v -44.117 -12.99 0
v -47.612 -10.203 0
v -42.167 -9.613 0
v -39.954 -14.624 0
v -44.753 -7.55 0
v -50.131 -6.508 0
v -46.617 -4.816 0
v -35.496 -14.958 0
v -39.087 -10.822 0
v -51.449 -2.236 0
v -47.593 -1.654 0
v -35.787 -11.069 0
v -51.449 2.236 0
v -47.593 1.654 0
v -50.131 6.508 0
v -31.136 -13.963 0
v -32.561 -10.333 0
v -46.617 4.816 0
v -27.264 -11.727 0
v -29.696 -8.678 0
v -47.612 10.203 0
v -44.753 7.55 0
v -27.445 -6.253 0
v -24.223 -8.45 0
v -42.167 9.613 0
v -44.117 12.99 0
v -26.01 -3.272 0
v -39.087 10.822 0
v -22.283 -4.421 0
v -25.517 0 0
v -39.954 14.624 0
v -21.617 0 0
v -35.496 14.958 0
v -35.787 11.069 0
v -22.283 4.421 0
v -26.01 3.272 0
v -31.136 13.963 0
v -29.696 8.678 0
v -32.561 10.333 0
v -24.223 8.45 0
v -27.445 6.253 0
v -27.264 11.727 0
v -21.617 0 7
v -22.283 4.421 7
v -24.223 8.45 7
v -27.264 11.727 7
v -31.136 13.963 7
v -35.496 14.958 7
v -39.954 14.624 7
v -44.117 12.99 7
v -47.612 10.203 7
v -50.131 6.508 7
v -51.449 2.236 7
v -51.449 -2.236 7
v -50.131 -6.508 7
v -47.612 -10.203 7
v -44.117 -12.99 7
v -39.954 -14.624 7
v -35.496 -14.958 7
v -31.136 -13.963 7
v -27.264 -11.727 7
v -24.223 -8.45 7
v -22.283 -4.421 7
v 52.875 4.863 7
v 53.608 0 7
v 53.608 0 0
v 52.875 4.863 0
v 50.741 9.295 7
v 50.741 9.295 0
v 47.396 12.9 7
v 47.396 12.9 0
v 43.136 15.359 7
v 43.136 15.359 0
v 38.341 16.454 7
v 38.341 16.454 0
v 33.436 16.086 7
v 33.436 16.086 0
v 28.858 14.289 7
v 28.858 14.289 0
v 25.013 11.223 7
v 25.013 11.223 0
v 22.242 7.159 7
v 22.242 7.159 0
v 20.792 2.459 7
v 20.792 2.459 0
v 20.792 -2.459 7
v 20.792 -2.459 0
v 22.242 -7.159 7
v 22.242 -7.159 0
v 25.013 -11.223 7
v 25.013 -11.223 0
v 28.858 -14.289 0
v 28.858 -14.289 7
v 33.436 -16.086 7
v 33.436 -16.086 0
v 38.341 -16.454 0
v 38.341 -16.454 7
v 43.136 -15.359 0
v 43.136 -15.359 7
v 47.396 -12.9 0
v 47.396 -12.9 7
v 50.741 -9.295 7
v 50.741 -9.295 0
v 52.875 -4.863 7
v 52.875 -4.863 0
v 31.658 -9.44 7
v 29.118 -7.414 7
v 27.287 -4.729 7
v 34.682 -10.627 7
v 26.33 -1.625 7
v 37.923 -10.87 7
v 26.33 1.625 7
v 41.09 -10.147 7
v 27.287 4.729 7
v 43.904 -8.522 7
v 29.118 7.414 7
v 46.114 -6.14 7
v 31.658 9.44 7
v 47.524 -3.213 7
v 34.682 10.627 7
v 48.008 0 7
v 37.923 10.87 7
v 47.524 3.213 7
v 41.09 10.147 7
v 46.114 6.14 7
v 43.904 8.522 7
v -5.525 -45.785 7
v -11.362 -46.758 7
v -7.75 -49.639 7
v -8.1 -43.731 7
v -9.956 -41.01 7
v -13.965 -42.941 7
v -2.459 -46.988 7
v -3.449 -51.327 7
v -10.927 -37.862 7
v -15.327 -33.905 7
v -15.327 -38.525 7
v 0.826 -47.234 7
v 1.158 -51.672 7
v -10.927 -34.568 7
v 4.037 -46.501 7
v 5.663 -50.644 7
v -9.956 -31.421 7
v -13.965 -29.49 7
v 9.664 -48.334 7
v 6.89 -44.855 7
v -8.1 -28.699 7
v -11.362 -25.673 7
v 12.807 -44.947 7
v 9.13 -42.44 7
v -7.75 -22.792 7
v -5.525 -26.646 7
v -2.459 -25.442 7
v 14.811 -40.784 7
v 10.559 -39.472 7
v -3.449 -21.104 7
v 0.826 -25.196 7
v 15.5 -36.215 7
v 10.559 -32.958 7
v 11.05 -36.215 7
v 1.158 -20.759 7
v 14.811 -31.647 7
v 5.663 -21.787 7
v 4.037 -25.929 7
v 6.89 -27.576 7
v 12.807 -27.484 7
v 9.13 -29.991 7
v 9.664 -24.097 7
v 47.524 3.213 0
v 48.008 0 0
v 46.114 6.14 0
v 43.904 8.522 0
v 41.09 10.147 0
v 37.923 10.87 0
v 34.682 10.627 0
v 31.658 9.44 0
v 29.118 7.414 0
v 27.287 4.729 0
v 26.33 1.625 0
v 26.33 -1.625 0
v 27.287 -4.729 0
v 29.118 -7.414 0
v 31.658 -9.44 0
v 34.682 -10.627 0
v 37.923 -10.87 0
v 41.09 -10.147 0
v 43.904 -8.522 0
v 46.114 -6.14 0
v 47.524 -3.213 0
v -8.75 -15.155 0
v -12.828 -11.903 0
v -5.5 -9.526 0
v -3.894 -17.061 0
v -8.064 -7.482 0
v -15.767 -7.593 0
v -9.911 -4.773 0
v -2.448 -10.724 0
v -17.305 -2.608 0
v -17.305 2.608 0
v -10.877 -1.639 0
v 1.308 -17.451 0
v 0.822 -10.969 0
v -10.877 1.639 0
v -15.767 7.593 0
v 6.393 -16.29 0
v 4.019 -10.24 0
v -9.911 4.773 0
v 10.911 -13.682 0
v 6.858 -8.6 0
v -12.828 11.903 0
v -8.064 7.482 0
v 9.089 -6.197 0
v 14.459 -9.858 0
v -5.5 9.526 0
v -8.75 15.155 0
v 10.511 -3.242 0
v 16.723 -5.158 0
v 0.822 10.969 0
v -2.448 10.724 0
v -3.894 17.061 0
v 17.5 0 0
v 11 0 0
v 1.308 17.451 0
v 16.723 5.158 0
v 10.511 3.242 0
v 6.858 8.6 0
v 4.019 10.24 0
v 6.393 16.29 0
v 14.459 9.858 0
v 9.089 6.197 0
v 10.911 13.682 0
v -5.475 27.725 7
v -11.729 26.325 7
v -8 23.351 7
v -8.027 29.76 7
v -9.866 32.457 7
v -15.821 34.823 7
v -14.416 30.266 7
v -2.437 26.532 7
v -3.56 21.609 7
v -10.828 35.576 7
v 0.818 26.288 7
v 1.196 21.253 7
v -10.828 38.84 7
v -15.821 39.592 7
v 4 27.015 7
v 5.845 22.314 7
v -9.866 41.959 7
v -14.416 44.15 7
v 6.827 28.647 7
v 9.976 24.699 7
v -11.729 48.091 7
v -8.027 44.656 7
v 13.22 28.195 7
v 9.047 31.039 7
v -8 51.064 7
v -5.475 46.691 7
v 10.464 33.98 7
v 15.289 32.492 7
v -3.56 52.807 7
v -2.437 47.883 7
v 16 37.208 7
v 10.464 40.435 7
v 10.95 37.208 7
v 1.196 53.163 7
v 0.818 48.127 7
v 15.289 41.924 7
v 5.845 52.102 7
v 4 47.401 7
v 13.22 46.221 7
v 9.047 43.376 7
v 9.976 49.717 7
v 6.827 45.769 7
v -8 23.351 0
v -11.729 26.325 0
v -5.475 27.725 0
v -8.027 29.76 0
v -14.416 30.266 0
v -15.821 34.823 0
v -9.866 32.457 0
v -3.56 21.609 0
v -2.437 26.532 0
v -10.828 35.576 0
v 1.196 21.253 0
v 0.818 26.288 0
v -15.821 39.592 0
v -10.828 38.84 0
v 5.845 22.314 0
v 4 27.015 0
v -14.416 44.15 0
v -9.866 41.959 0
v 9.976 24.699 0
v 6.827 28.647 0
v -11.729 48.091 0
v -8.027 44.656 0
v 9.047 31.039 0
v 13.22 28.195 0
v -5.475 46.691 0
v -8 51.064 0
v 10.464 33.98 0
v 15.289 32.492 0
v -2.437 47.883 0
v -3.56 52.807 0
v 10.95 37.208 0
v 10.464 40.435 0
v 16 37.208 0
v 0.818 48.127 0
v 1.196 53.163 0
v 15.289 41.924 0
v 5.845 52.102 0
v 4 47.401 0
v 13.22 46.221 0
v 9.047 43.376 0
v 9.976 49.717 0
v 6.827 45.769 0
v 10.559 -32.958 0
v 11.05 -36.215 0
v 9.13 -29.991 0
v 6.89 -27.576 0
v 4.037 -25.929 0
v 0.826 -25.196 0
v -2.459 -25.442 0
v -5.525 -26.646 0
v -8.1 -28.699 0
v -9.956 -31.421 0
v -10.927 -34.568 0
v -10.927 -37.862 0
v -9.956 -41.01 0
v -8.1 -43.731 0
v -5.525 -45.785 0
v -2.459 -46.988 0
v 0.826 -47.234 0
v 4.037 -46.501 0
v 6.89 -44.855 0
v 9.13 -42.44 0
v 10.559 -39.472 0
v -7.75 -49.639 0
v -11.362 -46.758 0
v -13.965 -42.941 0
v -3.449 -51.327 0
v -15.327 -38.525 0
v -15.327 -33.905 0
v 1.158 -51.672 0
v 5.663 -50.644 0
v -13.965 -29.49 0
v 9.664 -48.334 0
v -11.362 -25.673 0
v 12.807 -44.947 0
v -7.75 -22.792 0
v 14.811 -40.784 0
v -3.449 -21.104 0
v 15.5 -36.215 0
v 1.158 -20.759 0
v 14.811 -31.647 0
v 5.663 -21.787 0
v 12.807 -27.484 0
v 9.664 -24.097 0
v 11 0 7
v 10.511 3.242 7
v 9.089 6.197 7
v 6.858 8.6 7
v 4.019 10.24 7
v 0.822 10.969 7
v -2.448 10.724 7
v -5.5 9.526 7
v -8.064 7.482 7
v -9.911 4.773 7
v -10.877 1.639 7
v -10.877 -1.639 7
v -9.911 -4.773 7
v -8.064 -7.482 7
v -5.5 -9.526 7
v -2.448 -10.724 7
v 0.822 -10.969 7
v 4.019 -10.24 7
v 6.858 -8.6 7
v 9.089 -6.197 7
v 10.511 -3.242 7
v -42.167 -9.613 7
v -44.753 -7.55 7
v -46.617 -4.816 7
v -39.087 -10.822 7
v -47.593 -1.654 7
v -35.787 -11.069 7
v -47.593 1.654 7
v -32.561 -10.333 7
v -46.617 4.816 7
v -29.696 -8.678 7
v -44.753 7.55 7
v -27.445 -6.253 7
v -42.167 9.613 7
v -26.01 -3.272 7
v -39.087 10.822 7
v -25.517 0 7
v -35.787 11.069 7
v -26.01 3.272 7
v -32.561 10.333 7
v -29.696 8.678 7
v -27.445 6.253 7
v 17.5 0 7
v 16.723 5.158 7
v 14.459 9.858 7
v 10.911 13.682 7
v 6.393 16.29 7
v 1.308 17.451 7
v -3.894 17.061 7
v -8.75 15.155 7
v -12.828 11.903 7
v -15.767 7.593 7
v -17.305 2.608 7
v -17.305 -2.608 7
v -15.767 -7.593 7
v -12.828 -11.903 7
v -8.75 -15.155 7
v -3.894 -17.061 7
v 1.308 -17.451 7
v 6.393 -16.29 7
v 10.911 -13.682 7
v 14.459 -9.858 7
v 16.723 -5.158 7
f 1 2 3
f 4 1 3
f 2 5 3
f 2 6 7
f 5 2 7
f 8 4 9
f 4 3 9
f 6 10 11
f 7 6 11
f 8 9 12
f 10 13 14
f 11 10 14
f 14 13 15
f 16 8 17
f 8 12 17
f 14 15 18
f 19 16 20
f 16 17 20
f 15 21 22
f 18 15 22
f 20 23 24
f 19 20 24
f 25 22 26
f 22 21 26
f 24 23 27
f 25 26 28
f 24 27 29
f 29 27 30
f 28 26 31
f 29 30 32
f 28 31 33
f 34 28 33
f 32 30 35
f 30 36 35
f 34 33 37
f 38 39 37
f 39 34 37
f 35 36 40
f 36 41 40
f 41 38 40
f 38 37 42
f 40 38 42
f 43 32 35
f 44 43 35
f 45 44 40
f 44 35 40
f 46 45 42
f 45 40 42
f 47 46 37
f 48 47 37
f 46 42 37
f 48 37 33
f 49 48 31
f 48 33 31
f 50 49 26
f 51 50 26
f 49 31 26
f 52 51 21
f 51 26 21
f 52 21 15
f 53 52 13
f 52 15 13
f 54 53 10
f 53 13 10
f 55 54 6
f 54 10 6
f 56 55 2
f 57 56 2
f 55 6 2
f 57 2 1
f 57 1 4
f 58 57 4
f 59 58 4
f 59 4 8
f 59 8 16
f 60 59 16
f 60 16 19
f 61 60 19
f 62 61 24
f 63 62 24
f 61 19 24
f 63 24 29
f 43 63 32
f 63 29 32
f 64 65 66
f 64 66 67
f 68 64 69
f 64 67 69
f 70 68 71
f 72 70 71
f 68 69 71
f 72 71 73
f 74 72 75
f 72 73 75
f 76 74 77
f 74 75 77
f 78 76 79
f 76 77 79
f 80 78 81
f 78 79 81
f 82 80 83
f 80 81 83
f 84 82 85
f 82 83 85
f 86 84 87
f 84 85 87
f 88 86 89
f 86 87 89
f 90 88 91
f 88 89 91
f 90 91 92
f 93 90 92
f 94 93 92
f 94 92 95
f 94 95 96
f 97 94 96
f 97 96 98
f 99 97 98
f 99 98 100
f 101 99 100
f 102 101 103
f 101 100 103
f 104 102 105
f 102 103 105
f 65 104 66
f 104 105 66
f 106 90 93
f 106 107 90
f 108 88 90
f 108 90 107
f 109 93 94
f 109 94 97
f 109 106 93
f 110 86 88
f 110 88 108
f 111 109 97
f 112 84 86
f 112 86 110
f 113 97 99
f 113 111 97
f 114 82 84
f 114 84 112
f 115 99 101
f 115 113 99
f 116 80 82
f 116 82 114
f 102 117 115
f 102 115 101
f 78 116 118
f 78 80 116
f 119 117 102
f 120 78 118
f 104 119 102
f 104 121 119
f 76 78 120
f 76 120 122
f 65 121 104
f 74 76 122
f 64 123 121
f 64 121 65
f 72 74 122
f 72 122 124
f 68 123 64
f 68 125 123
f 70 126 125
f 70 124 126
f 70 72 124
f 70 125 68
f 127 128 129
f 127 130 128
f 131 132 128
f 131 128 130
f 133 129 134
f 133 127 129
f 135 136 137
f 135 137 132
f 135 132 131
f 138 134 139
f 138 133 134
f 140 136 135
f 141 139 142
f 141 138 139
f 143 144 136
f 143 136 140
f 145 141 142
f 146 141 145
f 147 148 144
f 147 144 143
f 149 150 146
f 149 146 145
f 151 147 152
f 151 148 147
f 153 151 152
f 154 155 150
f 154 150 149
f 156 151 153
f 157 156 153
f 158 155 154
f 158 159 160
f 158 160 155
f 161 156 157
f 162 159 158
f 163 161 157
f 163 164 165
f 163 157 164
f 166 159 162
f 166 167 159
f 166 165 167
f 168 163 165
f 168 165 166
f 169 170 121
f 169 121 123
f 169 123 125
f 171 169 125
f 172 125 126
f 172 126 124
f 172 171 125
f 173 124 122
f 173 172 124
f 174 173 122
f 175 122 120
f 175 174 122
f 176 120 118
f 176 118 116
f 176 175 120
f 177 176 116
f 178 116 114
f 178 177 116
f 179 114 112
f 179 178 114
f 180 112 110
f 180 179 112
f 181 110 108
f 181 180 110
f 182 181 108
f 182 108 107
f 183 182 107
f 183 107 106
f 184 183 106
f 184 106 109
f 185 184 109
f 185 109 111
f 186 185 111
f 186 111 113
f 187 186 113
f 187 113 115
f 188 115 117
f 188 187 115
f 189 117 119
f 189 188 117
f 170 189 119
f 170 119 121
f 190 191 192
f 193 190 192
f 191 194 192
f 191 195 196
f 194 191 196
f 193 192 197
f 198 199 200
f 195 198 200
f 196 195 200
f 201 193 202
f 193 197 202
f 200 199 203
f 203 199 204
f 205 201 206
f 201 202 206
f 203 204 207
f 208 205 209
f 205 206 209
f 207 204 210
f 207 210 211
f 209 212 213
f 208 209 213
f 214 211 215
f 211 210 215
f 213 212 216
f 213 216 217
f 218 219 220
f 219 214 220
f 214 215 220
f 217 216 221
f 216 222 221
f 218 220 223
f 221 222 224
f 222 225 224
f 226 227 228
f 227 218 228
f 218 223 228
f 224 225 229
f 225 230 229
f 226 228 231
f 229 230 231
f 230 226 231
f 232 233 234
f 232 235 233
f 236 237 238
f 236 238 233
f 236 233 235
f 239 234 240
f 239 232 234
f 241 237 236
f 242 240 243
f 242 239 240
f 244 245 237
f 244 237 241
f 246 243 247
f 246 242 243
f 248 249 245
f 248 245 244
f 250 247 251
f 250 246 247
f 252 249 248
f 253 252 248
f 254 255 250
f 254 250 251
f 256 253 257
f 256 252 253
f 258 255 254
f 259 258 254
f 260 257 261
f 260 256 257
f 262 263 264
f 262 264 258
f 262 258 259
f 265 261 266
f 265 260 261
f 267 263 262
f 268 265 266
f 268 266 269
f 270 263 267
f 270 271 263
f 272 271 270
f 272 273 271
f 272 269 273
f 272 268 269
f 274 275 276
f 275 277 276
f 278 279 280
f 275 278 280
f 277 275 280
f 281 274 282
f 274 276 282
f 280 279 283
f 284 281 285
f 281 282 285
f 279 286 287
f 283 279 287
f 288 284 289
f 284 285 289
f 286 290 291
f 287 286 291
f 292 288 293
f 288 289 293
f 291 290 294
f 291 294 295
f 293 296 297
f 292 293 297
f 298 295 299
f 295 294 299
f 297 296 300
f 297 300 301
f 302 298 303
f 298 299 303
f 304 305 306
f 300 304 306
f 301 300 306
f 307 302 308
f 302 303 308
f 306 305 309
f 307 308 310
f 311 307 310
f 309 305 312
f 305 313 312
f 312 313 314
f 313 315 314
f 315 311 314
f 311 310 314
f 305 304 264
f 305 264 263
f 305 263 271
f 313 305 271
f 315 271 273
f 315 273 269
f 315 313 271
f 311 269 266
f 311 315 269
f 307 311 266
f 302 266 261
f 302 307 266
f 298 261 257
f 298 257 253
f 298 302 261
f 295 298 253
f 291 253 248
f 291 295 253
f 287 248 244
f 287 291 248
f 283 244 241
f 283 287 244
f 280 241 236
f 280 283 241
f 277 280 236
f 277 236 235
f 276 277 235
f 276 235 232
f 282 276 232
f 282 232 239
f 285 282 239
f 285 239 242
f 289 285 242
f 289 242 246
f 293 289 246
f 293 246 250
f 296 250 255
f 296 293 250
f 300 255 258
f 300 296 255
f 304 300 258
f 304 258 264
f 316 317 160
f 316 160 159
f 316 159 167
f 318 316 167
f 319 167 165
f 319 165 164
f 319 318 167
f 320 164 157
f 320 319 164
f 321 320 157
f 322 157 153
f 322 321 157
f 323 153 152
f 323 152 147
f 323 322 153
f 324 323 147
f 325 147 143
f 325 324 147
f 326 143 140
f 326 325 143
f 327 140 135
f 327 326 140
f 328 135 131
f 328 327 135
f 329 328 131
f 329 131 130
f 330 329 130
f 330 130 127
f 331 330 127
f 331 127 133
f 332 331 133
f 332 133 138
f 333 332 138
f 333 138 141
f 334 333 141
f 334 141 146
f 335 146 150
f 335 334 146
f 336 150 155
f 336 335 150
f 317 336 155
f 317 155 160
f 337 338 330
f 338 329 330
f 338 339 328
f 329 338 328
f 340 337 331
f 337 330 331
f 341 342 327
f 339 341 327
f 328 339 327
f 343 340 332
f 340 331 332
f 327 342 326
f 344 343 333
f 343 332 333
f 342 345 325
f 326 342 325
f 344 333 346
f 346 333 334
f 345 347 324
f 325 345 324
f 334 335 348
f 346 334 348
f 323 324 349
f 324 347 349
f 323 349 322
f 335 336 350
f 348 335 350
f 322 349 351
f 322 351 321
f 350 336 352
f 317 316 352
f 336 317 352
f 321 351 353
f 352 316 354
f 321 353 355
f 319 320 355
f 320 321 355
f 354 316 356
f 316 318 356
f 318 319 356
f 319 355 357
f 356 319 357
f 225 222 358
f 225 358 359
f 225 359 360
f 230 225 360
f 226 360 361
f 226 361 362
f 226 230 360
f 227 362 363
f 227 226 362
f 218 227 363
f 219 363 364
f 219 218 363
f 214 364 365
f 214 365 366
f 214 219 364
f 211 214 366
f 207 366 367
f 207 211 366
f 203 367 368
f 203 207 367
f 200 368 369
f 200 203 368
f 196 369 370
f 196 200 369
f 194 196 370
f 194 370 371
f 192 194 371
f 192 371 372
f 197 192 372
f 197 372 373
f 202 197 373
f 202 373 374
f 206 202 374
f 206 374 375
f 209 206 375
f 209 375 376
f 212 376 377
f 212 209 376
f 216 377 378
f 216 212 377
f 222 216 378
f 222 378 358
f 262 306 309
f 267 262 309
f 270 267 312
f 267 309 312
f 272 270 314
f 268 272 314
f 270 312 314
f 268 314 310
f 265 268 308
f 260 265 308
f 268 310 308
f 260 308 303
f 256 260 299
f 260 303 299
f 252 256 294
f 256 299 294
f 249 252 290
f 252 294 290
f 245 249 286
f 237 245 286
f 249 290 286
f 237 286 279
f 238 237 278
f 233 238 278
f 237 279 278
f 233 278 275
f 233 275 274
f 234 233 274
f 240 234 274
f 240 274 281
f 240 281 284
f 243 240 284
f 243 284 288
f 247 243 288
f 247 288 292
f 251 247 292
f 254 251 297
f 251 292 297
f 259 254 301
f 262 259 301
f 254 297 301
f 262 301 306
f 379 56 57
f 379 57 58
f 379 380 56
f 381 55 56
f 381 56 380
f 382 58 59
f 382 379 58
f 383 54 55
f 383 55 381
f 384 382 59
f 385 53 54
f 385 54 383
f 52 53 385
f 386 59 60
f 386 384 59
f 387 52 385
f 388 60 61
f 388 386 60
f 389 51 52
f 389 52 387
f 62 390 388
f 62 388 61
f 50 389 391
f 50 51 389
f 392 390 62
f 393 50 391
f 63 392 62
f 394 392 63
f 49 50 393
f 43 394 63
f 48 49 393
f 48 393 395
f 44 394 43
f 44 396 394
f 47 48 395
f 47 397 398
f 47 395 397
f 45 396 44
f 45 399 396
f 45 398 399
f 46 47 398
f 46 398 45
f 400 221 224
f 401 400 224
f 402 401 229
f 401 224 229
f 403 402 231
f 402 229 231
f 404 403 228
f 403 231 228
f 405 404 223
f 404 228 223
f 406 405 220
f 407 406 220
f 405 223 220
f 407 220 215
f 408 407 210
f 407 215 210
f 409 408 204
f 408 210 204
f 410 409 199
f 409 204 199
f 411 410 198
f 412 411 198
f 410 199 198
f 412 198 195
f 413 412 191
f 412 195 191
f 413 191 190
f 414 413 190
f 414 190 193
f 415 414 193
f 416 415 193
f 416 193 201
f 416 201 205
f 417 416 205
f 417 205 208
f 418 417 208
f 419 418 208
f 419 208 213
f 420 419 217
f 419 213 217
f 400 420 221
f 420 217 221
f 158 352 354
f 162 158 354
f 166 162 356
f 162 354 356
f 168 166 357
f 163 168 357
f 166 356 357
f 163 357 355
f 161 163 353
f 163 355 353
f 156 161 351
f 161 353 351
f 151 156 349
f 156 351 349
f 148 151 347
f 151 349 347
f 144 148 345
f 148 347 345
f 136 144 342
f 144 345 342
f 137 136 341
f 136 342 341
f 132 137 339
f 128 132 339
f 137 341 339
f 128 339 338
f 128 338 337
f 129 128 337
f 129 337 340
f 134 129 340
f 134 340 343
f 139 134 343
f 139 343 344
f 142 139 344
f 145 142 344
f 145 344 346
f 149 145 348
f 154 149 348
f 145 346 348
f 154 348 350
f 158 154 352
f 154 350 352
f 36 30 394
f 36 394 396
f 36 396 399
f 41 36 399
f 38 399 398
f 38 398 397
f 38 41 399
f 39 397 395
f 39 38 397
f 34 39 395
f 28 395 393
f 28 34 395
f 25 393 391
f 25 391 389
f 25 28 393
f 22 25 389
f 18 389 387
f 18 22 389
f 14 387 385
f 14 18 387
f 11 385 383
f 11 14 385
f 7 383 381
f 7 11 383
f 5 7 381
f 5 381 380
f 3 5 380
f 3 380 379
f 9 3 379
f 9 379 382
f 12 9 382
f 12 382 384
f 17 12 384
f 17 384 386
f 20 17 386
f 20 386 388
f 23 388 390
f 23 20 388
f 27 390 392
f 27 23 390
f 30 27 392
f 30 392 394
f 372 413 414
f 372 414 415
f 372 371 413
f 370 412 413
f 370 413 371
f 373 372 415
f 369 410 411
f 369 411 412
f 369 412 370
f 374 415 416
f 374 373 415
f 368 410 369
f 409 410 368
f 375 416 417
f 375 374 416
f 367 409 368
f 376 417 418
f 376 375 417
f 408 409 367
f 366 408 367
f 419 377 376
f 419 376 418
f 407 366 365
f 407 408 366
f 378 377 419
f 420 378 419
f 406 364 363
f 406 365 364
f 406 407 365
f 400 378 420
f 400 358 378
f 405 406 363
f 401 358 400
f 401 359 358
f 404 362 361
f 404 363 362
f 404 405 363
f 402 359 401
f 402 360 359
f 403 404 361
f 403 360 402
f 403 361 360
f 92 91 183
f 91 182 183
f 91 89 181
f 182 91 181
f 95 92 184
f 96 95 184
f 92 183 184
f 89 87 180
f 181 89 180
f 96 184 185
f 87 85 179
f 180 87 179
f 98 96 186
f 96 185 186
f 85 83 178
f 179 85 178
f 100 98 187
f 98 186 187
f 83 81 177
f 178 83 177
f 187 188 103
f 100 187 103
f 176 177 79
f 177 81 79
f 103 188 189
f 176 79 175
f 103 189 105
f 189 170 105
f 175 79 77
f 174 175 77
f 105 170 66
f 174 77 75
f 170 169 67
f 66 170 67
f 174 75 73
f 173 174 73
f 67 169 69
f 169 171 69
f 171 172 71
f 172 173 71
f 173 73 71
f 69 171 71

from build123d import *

# Parameters (mm, degrees)
F0_R     = 16
F0_R_2   = 10.95
F0_R_3   = 17.5
F0_R_4   = 11
F0_R_5   = 15
F0_R_6   = 11.1
F0_R_7   = 15.5
F0_R_8   = 11.05
F0_R_9   = 16.5
F0_R_10  = 10.9
F1_DEPTH = 7


with BuildPart() as f1:
    # F0 (on Top) → F1 (new body)
    with BuildSketch(Plane.XY):
        with Locations((0, 37.207809)):
            Circle(F0_R)
        with Locations((0, 37.207809)):
            Circle(F0_R_2, mode=Mode.SUBTRACT)
        Circle(F0_R_3)
        Circle(F0_R_4, mode=Mode.SUBTRACT)
        with Locations((-36.616529, 0)):
            Circle(F0_R_5)
        with Locations((-36.616529, 0)):
            Circle(F0_R_6, mode=Mode.SUBTRACT)
        with Locations((0, -36.215333)):
            Circle(F0_R_7)
        with Locations((0, -36.215333)):
            Circle(F0_R_8, mode=Mode.SUBTRACT)
        with Locations((37.107967, 0)):
            Circle(F0_R_9)
        with Locations((37.107967, 0)):
            Circle(F0_R_10, mode=Mode.SUBTRACT)
    extrude(amount=F1_DEPTH)


solid = f1.part
